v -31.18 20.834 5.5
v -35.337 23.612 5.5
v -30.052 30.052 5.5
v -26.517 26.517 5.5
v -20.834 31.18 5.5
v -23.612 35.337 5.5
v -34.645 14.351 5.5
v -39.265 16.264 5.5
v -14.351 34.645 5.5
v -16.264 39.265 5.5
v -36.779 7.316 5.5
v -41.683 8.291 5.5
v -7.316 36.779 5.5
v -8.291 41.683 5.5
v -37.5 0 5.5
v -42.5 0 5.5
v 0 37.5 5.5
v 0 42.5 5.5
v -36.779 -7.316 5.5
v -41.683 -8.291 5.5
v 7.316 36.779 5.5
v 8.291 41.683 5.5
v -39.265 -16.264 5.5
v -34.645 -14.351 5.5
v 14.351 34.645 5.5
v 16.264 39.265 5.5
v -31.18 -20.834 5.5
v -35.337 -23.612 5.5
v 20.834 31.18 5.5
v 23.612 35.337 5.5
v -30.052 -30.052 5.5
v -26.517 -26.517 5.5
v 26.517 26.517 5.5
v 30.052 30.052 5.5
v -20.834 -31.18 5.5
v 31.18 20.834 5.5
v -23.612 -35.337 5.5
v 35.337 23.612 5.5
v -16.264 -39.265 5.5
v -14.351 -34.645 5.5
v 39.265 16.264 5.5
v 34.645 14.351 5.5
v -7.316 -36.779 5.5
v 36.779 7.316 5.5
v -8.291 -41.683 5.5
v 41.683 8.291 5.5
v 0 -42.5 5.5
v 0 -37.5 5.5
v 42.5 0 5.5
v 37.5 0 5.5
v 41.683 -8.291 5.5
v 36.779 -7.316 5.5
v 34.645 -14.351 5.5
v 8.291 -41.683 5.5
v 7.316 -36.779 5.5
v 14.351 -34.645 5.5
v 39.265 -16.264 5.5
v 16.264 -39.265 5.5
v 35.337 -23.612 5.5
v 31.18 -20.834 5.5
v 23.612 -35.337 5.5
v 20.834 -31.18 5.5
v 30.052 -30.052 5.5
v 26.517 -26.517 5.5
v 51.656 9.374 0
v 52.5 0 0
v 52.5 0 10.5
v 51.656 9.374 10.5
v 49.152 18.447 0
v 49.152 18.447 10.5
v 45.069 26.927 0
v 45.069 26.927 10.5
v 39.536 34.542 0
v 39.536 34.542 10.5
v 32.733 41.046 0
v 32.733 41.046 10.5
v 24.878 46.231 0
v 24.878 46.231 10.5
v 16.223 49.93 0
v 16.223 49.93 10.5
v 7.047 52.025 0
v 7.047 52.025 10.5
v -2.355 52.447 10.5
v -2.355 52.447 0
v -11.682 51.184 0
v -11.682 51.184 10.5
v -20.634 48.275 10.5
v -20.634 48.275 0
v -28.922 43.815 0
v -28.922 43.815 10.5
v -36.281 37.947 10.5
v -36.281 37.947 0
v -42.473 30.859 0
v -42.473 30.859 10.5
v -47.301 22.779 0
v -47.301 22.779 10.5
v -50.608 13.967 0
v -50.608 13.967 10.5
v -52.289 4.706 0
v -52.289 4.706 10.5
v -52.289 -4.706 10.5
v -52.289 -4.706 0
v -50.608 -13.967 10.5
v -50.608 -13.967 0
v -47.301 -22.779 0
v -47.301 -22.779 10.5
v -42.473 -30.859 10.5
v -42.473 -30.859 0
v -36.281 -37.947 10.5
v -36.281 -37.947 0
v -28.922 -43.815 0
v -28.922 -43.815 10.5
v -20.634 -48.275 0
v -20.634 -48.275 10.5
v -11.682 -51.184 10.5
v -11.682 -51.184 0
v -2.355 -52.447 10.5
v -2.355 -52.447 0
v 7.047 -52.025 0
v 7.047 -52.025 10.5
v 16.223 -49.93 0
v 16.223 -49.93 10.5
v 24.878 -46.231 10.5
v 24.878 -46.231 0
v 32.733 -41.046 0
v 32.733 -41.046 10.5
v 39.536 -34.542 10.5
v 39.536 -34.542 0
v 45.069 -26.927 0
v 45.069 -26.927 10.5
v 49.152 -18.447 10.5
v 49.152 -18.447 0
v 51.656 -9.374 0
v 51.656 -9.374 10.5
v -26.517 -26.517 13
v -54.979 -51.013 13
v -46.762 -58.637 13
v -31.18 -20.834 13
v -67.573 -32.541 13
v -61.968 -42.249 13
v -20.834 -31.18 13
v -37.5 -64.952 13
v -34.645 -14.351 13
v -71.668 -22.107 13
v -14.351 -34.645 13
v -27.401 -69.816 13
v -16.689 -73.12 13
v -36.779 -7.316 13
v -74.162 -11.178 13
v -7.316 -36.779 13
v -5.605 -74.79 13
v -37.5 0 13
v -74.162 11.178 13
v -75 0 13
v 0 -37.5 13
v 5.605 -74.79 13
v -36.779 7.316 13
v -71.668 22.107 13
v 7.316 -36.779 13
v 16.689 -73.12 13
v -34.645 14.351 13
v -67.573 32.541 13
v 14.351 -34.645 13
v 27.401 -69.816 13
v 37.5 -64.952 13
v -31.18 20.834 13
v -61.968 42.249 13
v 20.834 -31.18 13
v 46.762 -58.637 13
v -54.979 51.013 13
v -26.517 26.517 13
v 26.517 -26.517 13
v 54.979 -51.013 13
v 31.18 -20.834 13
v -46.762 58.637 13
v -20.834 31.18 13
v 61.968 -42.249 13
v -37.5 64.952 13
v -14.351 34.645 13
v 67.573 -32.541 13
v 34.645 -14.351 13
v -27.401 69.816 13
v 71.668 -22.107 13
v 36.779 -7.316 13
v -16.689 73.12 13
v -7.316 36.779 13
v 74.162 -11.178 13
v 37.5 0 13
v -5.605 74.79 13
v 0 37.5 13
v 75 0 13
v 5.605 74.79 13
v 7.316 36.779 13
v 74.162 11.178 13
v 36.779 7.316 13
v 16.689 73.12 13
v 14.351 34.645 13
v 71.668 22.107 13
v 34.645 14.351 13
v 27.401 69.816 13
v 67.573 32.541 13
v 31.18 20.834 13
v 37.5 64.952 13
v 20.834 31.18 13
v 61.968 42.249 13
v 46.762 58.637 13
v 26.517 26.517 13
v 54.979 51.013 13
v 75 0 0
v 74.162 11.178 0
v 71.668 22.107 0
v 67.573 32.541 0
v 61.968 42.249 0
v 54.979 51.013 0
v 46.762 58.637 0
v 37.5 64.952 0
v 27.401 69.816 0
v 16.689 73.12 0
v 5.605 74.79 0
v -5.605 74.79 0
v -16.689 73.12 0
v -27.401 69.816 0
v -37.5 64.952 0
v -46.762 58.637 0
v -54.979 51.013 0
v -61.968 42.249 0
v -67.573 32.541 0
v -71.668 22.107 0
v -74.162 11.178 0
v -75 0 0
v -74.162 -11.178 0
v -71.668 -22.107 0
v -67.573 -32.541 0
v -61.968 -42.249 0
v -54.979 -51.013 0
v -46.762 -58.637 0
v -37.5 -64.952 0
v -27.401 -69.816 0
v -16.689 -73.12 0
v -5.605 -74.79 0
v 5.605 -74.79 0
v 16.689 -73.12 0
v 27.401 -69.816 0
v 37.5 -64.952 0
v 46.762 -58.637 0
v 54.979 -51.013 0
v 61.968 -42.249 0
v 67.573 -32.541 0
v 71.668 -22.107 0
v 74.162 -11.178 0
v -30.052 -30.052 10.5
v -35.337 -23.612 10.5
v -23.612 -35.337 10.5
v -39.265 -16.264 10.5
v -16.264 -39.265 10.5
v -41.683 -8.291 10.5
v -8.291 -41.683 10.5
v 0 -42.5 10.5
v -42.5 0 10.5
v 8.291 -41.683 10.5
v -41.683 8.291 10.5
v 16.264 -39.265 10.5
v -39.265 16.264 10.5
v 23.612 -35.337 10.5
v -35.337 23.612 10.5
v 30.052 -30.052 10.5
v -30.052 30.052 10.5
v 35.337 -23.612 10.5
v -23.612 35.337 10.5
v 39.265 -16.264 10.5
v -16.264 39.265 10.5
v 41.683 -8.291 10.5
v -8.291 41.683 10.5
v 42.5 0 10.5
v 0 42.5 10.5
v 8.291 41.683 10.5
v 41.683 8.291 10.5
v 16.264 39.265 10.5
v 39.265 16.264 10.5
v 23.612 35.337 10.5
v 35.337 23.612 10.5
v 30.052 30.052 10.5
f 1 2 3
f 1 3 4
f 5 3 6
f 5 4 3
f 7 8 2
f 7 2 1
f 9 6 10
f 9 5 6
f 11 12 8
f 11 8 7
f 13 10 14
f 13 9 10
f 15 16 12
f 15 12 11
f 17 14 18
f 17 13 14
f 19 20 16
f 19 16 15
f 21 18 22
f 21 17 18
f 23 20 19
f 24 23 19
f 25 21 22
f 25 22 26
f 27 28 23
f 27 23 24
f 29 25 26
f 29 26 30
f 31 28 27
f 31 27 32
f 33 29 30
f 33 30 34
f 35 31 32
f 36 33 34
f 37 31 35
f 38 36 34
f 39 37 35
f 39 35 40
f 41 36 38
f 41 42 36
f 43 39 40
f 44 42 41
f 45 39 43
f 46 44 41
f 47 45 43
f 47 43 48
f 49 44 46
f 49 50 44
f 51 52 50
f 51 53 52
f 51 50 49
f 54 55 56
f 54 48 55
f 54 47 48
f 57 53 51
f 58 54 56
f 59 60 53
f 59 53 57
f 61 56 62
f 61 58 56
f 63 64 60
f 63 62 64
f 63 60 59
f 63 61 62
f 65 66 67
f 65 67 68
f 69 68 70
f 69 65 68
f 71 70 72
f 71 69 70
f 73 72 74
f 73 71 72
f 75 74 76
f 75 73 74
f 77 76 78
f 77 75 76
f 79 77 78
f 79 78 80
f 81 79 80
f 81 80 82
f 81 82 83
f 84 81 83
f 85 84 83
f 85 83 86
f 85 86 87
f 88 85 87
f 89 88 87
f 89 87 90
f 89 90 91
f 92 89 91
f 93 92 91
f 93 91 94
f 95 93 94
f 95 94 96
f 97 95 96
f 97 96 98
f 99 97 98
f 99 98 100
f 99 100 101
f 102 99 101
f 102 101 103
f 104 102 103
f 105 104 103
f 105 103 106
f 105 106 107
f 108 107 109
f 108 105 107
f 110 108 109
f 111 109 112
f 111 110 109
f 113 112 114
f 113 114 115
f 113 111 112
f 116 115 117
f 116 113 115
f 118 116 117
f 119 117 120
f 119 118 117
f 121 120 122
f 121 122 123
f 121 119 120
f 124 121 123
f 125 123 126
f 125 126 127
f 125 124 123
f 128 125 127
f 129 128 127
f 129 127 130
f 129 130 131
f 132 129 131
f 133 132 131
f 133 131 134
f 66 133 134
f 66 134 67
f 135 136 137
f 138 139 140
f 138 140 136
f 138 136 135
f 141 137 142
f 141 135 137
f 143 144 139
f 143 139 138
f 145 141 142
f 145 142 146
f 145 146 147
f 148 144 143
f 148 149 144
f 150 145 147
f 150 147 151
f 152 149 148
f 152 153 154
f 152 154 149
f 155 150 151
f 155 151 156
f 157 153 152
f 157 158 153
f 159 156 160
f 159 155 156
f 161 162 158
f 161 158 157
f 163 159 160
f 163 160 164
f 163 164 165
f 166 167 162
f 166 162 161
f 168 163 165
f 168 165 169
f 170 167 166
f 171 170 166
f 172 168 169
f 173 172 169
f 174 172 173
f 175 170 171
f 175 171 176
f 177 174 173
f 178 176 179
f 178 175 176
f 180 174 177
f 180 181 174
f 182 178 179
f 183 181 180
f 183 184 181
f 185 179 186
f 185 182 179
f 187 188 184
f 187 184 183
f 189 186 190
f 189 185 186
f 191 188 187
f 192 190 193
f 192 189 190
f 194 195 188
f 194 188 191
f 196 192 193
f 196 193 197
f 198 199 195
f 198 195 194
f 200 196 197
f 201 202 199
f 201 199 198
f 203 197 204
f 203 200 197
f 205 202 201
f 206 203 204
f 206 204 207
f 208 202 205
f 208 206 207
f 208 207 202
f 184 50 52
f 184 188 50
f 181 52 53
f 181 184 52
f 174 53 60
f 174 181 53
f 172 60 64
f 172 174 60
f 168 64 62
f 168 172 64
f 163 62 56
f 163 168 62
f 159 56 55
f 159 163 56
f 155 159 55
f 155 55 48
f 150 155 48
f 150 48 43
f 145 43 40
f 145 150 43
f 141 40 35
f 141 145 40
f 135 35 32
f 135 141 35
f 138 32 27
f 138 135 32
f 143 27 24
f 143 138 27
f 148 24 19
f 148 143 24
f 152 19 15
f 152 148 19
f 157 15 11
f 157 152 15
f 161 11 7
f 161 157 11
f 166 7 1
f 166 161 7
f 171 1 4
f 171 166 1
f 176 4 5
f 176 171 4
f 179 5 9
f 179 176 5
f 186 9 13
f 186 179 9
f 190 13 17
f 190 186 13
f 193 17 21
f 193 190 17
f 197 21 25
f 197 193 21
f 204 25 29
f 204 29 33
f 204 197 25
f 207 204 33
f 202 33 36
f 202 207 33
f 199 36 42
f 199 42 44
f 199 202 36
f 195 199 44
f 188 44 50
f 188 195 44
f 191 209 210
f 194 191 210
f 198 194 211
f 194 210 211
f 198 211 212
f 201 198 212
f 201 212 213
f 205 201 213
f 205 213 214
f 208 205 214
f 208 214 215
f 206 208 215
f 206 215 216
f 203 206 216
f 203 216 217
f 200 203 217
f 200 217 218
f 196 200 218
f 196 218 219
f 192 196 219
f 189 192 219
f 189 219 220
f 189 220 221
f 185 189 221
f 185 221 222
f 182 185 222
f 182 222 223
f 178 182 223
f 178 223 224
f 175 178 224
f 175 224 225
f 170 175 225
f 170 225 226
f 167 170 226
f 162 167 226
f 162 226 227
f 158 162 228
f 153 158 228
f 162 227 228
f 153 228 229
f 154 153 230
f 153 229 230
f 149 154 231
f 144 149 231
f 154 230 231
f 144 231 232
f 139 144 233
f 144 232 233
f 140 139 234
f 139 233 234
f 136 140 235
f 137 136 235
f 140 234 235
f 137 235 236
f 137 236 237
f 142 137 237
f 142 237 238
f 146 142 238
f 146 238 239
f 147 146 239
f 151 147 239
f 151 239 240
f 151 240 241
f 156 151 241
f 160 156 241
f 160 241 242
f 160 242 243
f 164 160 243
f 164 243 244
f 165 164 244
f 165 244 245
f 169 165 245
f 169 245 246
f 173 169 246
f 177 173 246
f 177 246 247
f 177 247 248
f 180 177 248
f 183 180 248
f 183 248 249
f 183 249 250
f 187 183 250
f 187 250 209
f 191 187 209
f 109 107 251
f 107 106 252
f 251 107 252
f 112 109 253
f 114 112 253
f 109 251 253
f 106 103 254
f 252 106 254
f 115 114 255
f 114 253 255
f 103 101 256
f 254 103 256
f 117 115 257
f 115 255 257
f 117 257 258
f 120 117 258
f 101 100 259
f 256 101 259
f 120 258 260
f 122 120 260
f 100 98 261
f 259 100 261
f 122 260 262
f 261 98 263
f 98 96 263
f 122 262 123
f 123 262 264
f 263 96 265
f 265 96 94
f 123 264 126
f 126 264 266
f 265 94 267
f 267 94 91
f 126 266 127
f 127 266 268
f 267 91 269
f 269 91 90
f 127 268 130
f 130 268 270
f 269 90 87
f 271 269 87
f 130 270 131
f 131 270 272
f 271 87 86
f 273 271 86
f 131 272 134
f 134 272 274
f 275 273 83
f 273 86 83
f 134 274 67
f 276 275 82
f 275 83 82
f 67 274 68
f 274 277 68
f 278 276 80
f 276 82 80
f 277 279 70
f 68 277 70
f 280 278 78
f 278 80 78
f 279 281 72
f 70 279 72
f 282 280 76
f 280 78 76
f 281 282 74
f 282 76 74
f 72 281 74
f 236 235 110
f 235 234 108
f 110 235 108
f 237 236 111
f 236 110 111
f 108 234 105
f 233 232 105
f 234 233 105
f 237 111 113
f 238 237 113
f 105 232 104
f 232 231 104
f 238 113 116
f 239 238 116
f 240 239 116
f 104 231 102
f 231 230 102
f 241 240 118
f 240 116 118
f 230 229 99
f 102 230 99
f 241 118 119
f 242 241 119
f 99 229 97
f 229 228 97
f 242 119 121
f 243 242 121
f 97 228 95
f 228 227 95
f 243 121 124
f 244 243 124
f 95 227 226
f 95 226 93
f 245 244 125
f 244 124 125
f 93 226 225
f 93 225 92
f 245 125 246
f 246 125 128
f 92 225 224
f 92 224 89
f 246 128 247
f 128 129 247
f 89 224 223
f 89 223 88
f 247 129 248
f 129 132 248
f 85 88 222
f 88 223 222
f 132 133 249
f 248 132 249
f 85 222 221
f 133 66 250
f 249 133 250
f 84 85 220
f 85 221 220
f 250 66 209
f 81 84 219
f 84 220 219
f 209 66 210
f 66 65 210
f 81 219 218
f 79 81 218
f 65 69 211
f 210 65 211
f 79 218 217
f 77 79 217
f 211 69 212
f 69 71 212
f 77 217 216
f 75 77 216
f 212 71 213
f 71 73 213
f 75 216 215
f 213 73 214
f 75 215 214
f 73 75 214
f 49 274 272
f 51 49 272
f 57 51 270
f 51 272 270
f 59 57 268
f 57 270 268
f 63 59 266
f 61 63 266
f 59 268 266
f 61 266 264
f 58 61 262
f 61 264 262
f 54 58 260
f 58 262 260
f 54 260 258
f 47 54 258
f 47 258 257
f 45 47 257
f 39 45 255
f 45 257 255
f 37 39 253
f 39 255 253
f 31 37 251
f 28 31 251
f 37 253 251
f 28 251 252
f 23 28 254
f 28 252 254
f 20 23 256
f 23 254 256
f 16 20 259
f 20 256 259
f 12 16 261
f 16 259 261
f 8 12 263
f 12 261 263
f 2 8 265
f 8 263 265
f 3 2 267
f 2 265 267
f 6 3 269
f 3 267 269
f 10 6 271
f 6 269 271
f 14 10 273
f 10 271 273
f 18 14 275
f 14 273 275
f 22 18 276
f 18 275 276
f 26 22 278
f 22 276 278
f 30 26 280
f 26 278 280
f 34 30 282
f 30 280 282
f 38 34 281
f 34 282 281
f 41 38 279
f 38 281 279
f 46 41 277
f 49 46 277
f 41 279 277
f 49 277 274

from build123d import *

# Parameters (mm, degrees)
ESQUISSE1_R             = 75
ESQUISSE1_R_2           = 52.5
BOSS_EXTRU_1_DEPTH      = 30
ESQUISSE2_R             = 52.5
ESQUISSE2_R_2           = 37.5
BOSS_EXTRU_2_DEPTH      = 19.5
ESQUISSE3_R             = 42.5
ESQUISSE3_R_2           = 37.5
BOSS_EXTRU_3_DEPTH      = 5
ESQUISSE4_R             = 75
ESQUISSE4_R_2           = 37.5
ENL_V_MAT_EXTRU_1_DEPTH = 17


with BuildPart() as part:
    # Esquisse1 → Boss.-Extru.1 (new body)
    with BuildSketch(Plane.XY):
        Circle(ESQUISSE1_R)
        Circle(ESQUISSE1_R_2, mode=Mode.SUBTRACT)
    extrude(amount=BOSS_EXTRU_1_DEPTH)

    # Esquisse2 → Boss.-Extru.2 (add)
    with BuildSketch(Plane.XY.offset(30)):
        Circle(ESQUISSE2_R)
        Circle(ESQUISSE2_R_2, mode=Mode.SUBTRACT)
    extrude(amount=-BOSS_EXTRU_2_DEPTH)

    # Esquisse3 → Boss.-Extru.3 (add)
    with BuildSketch(Plane(origin=(0, 0, 10.5), x_dir=(-1, 0, 0), z_dir=(0, 0, -1))):
        with Locations(Location((0, 0, 0), (0, 0, 180))):
            Circle(ESQUISSE3_R)
        with Locations(Location((0, 0, 0), (0, 0, 180))):
            Circle(ESQUISSE3_R_2, mode=Mode.SUBTRACT)
    extrude(amount=BOSS_EXTRU_3_DEPTH)

    # Esquisse4 → Enlèv. mat.-Extru.1 (cut)
    with BuildSketch(Plane.XY.offset(30)):
        Circle(ESQUISSE4_R)
        Circle(ESQUISSE4_R_2, mode=Mode.SUBTRACT)
    extrude(amount=-ENL_V_MAT_EXTRU_1_DEPTH, mode=Mode.SUBTRACT)


solid = part.part
